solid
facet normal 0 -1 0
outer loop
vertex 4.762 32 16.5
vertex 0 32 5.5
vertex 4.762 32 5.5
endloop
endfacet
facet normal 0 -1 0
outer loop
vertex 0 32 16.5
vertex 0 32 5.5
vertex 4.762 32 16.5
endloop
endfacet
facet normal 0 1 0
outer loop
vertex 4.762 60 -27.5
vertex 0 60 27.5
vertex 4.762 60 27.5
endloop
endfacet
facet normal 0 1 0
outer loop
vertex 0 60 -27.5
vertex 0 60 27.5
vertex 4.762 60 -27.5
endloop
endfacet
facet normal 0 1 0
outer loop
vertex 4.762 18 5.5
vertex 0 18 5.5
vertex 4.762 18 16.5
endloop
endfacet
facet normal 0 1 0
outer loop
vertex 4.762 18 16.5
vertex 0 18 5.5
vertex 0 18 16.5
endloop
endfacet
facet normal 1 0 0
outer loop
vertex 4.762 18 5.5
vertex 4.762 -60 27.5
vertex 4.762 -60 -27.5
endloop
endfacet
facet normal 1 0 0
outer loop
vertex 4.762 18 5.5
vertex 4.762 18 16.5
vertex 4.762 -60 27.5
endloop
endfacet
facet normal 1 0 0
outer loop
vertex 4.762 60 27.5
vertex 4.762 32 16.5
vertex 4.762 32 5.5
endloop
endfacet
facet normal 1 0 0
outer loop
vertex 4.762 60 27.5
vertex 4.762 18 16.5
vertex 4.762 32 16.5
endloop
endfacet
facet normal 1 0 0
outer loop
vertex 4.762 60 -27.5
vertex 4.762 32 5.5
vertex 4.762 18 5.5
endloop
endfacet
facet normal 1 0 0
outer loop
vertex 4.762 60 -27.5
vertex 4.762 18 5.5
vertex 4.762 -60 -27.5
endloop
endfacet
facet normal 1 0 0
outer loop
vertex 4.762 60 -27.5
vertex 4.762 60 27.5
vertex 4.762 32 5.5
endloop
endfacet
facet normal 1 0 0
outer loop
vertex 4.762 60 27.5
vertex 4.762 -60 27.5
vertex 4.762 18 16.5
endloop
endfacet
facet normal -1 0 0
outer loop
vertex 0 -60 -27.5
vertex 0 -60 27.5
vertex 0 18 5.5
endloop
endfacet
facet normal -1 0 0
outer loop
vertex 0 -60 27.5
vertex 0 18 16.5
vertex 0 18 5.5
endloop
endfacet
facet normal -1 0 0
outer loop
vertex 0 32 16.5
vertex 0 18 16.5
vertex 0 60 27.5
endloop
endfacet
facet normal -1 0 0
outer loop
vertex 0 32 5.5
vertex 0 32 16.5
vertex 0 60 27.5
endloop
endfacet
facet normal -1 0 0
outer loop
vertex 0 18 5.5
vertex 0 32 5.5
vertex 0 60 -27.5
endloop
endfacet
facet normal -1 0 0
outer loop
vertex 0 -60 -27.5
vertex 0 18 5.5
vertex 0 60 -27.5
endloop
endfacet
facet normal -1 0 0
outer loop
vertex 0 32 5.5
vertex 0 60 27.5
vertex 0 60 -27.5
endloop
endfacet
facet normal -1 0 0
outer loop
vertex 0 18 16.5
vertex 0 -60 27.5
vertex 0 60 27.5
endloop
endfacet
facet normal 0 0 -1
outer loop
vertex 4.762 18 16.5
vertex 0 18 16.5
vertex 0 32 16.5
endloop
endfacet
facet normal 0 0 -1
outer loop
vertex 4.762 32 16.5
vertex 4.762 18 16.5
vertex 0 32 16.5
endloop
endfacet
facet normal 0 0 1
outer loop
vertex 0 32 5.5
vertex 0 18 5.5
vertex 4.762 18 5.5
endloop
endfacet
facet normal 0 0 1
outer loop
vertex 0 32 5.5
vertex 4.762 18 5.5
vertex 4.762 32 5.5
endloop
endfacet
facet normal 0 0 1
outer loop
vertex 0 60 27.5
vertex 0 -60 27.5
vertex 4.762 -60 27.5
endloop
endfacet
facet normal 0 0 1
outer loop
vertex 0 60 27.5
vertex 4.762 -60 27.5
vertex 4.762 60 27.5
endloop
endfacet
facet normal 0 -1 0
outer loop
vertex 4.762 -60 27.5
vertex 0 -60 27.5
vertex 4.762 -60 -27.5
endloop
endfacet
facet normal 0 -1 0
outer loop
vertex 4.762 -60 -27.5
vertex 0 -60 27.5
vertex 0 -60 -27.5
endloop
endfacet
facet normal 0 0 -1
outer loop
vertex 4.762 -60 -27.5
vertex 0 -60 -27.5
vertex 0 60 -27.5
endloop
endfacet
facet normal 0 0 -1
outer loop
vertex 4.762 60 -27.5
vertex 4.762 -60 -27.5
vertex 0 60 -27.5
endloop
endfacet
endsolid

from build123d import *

# Parameters (mm, degrees)
SKETCH1_W           = 55
SKETCH1_H           = 120
BOSS_EXTRUDE1_DEPTH = 4.7625
SKETCH2_W           = 11
SKETCH2_H           = 14
CUT_EXTRUDE1_DEPTH  = 5.7625


with BuildPart() as part:
    # Sketch1 → Boss-Extrude1 (new body)
    with BuildSketch(Plane(origin=(0, 0, 0), x_dir=(0, 0, -1), z_dir=(1, 0, 0))):
        Rectangle(SKETCH1_W, SKETCH1_H)
    extrude(amount=BOSS_EXTRUDE1_DEPTH)

    # Sketch2 → Cut-Extrude1 (cut, through all)
    with BuildSketch(Plane.ZY):
        with Locations((11, 25)):
            Rectangle(SKETCH2_W, SKETCH2_H)
    extrude(amount=-CUT_EXTRUDE1_DEPTH, mode=Mode.SUBTRACT)


solid = part.part
